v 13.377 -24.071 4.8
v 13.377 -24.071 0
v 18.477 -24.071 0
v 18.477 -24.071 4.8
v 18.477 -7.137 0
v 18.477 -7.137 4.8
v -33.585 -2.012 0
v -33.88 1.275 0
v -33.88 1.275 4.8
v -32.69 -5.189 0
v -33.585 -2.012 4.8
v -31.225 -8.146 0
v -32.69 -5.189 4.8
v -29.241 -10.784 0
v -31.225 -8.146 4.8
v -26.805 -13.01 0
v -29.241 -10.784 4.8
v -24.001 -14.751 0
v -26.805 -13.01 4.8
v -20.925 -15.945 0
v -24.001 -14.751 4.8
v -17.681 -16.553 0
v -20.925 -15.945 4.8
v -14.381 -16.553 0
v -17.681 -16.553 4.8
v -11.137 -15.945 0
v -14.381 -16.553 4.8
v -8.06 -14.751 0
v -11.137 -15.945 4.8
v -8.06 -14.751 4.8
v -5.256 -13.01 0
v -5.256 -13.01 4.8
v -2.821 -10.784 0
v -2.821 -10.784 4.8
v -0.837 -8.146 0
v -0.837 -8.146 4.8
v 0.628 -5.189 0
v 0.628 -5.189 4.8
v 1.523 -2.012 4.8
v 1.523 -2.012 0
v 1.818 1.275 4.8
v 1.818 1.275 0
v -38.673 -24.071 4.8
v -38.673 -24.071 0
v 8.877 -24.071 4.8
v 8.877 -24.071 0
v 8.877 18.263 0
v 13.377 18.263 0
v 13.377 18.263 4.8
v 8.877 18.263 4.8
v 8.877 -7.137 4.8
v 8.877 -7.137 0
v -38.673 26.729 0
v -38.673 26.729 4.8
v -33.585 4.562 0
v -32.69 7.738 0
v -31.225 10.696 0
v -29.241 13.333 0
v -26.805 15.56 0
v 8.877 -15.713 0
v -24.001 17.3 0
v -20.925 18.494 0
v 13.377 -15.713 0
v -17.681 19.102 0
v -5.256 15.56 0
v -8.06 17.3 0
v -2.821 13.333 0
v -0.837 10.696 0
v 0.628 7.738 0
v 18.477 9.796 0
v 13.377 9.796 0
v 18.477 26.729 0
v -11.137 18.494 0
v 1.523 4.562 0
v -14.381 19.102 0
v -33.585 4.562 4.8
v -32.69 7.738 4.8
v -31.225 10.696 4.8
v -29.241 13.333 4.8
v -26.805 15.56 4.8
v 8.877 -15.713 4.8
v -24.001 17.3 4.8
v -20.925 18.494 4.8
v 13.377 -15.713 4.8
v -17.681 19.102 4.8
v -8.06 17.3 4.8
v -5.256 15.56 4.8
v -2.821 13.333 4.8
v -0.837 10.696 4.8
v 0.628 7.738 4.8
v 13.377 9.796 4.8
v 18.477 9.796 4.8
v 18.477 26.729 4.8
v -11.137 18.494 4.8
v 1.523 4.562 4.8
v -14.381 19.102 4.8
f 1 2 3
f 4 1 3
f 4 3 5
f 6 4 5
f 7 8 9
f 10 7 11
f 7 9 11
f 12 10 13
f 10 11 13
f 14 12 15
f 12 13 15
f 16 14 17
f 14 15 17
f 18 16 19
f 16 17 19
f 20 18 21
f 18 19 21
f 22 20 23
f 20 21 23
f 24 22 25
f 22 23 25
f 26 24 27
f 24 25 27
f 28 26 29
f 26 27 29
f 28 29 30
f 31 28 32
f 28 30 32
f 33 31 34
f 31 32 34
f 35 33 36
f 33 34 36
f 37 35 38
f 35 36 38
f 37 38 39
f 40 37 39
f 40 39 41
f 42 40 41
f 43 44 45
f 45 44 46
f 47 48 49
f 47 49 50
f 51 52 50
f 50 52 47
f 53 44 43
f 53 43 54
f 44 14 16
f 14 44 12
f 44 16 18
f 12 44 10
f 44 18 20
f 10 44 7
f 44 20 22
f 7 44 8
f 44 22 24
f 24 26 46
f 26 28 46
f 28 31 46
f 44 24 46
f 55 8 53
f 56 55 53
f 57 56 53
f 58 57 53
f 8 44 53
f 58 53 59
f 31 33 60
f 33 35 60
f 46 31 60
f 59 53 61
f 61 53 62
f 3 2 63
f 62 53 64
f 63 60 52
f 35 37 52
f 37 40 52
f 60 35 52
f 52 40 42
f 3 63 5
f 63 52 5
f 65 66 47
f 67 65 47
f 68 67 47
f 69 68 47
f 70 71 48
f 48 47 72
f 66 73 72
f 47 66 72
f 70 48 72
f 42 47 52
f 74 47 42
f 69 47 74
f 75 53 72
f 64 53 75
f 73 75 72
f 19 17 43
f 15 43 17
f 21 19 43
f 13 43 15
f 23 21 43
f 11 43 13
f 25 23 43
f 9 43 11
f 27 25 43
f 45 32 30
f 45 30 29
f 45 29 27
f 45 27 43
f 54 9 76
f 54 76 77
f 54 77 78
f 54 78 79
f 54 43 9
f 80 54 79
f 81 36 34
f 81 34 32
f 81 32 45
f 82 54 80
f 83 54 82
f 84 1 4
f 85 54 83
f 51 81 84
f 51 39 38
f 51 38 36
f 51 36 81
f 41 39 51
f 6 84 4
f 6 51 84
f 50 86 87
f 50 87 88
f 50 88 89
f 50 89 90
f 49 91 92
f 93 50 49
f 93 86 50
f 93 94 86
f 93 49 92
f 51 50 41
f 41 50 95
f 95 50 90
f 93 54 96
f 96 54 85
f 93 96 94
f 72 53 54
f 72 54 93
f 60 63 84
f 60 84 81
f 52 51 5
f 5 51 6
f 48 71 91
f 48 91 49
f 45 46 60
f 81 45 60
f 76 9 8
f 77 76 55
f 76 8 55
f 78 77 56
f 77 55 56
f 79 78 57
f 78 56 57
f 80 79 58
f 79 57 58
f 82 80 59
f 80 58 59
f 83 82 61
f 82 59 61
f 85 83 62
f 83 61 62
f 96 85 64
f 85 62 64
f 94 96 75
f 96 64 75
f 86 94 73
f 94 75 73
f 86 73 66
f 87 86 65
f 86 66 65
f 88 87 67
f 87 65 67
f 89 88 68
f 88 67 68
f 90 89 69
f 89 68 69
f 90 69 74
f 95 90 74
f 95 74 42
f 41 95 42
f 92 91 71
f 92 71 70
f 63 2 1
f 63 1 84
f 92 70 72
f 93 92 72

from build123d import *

# Parameters (mm, degrees)
SKETCH1_W           = 57.15
SKETCH1_H           = 50.8
BOSS_EXTRUDE1_DEPTH = 4.800000052
SKETCH3_W           = 9.600000104
SKETCH3_H           = 16.933333334
CUT_EXTRUDE2_DEPTH  = 48.255810933
SKETCH7_R           = 17.849200014
CUT_EXTRUDE6_DEPTH  = 100.442088012
SKETCH4_W           = 4.500000144
SKETCH4_H           = 8.466666666
SKETCH4_H_2         = 8.357391871
CUT_EXTRUDE7_DEPTH  = 48.255810933
SKETCH8_R           = 17.849200014
CUT_EXTRUDE8_DEPTH  = 100.528553706


with BuildPart() as part:
    # Sketch1 → Boss-Extrude1 (new body)
    with BuildSketch(Plane.XY):
        with Locations((-10.098235381, 1.329244875)):
            Rectangle(SKETCH1_W, SKETCH1_H)
    extrude(amount=BOSS_EXTRUDE1_DEPTH)

    # Sketch3 → Cut-Extrude2 (cut, through all)
    with BuildSketch(Plane.XY.offset(4.800000052)):
        with Locations((13.676764567, 1.329244875)):
            Rectangle(SKETCH3_W, SKETCH3_H)
    extrude(amount=-CUT_EXTRUDE2_DEPTH, mode=Mode.SUBTRACT)

    # Sketch7 → Cut-Extrude6 (cut, through all)
    with BuildSketch(Plane(origin=(21.96927249, 54.594199632, 4.800000052), x_dir=(0.8370756248818486, 0.5470871943563135, 0), z_dir=(0, 0, 1))):
        with Locations(Location((-61.009273933, -23.888925268, 0), (0, 0, 326.832589089))):
            Circle(SKETCH7_R)
    extrude(amount=-CUT_EXTRUDE6_DEPTH, mode=Mode.SUBTRACT)

    # Sketch4 → Cut-Extrude7 (cut, through all)
    with BuildSketch(Plane(origin=(0, 0, 0), x_dir=(-1, 0, 0), z_dir=(0, 0, -1))):
        with Locations((-11.126764587, 14.029244875)):
            Rectangle(SKETCH4_W, SKETCH4_H)
        with Locations((-11.126764587, -19.89205919)):
            Rectangle(SKETCH4_W, SKETCH4_H_2)
    extrude(amount=-CUT_EXTRUDE7_DEPTH, mode=Mode.SUBTRACT)

    # Sketch8 → Cut-Extrude8 (cut, through all)
    with BuildSketch(Plane(origin=(21.96927249, 54.703474427, 0), x_dir=(0, -1, 0), z_dir=(0, 0, -1))):
        with Locations((53.374229552, 38.000051)):
            Circle(SKETCH8_R)
    extrude(amount=-CUT_EXTRUDE8_DEPTH, mode=Mode.SUBTRACT)


solid = part.part
